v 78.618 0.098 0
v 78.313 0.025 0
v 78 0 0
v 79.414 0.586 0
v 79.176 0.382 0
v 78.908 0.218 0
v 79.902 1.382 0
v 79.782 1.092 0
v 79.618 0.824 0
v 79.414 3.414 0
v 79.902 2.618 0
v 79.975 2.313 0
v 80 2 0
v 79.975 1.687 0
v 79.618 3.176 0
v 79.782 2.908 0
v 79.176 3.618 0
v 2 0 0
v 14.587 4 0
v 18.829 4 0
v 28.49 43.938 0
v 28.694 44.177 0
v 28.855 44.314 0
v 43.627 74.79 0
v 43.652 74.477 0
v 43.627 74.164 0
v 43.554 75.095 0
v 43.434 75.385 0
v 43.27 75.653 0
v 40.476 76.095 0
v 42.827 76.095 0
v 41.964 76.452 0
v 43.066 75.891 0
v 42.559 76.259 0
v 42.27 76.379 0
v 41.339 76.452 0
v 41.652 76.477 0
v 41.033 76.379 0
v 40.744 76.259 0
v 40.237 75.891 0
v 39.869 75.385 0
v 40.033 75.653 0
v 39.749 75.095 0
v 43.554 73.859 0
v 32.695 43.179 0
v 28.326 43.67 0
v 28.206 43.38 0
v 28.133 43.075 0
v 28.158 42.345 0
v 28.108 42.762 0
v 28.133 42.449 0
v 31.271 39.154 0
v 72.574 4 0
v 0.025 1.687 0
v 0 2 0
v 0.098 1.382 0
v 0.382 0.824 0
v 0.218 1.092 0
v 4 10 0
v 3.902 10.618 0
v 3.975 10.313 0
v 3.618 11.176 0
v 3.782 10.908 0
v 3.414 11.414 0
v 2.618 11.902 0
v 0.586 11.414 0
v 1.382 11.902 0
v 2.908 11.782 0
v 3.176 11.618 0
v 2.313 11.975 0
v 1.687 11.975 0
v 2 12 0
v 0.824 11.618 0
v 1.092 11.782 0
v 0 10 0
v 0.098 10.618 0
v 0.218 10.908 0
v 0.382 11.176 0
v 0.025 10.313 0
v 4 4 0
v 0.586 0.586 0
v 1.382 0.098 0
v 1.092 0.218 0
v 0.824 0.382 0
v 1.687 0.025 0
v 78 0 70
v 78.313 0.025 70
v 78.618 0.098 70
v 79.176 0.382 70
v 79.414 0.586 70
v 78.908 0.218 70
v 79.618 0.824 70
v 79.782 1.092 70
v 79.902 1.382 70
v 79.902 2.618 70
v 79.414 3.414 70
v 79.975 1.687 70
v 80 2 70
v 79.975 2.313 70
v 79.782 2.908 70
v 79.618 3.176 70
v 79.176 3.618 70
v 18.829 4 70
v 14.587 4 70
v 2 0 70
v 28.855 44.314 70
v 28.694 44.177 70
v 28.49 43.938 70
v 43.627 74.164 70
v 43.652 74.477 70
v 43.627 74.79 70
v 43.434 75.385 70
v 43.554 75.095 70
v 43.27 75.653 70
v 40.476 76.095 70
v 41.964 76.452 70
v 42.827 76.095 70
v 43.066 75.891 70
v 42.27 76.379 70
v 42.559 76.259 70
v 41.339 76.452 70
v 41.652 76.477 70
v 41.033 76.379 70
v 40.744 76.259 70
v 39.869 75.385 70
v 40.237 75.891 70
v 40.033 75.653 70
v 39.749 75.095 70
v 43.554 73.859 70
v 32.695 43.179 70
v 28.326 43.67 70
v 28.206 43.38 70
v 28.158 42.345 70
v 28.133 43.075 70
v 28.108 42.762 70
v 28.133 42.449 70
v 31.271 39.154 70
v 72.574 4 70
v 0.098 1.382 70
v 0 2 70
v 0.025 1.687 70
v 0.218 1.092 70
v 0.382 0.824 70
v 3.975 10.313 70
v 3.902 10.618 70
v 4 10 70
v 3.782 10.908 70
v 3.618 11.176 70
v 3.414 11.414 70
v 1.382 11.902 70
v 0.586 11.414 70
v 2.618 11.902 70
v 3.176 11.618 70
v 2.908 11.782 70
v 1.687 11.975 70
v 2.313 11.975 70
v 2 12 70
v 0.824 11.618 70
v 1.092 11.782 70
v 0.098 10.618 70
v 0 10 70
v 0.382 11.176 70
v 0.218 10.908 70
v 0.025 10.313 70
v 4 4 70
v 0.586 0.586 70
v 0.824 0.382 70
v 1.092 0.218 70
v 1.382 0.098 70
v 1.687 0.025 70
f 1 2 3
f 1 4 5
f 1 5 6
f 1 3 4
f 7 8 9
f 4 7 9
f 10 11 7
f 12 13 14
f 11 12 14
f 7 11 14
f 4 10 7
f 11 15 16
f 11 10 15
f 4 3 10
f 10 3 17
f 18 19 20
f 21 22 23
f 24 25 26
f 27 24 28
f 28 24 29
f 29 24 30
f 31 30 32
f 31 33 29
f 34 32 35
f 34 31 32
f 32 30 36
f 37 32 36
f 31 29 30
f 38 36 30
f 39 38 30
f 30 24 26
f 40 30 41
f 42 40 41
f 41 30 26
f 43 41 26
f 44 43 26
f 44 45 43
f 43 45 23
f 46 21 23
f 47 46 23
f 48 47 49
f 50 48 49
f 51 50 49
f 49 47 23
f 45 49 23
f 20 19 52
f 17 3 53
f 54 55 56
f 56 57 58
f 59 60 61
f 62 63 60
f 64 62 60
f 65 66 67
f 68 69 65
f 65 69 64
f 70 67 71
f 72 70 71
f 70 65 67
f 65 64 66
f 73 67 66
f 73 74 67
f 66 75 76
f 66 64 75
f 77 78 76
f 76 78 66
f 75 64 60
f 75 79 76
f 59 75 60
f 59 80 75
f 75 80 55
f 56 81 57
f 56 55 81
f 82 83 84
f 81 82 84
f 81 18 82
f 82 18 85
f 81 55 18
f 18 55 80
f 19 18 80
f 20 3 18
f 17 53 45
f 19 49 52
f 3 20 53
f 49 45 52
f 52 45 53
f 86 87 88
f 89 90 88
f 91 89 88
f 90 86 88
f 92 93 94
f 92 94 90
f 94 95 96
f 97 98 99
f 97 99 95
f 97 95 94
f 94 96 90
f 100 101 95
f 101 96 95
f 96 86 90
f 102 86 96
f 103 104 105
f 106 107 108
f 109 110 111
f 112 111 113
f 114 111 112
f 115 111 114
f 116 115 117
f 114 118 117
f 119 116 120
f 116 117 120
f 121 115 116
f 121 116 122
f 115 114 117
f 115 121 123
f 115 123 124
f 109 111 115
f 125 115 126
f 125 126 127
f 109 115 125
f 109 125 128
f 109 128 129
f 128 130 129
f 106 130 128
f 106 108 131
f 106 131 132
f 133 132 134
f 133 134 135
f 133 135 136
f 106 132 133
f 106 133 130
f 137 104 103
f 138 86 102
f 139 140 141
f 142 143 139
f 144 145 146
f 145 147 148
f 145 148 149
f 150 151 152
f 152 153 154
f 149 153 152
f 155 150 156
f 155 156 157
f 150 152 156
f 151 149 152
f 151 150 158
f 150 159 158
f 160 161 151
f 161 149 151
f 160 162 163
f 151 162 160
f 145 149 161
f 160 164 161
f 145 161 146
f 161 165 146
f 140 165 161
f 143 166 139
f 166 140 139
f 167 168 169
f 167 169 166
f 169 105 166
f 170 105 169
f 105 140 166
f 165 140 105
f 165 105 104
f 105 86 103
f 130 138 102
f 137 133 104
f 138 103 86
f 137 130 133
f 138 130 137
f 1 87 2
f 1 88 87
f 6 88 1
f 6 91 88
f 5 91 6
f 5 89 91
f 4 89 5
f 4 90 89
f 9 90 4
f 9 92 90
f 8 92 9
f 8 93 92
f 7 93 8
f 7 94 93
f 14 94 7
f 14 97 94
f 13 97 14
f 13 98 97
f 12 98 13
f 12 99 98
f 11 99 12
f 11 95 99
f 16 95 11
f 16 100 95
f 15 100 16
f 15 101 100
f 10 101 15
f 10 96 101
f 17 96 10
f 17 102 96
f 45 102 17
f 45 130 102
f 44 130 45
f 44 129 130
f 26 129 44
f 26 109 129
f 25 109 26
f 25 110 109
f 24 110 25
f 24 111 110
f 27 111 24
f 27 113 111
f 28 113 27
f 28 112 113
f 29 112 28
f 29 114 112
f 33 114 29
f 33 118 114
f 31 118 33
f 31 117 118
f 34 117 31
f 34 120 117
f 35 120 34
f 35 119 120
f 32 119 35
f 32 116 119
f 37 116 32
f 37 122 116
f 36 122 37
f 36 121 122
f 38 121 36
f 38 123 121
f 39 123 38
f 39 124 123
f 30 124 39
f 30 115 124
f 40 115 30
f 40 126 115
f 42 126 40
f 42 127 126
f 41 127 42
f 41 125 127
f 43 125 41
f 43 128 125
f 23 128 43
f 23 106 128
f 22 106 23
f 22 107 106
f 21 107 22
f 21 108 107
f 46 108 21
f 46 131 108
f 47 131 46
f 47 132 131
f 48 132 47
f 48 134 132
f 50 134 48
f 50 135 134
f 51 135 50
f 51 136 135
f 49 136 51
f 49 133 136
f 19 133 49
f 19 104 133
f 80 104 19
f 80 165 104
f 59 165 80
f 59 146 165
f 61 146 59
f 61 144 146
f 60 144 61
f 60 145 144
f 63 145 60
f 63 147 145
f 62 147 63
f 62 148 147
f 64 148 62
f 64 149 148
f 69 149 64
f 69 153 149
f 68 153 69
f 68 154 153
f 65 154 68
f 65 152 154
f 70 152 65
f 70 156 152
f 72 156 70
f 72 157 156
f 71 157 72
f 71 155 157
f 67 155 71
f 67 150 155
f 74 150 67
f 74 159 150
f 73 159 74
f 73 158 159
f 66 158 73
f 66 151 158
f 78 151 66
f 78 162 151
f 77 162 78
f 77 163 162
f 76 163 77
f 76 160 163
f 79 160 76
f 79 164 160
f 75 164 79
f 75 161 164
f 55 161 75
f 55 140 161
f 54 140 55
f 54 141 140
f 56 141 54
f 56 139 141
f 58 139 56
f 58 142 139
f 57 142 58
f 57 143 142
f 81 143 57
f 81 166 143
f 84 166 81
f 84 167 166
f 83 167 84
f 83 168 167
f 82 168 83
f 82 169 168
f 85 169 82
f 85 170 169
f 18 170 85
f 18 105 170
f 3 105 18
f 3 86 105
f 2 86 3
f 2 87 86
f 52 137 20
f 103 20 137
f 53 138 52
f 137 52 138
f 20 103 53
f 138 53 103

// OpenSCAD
// Telefoonhouder / tabletstandaard
// Geschreven voor Tech demo 14 (OpenSCAD customizer). Licentie: CC0 1.0 / MIT.
// Ligt op zijn zijkant op het bed: geen support nodig en sterk in de lagen.

/* [Houder] */
// Breedte van de houder (mm)
breedte = 70; // [30:1:160]
// Kijkhoek ten opzichte van verticaal (graden)
hoek = 20; // [5:1:40]
// Dikte van je telefoon met hoesje (mm)
telefoon_dikte = 12; // [6:0.5:25]
// Lengte van de rugsteun (mm)
rug_lengte = 75; // [40:1:140]
// Lengte van de voet (mm)
voet_lengte = 80; // [50:1:150]
// Hoogte van de voorrand (mm)
voorrand = 10; // [5:0.5:25]
// Dikte van de delen (mm)
dikte = 4; // [3:0.5:8]

/* [Hidden] */
$fn = 40;

module staaf(a, b, d) { hull() { translate(a) circle(d = d); translate(b) circle(d = d); } }

module profiel() {
  r = dikte / 2;
  // goot: voorrand bij x=0, achterkant goot bij x = telefoon_dikte + dikte
  bak = telefoon_dikte + dikte;
  top = [bak + sin(hoek) * rug_lengte, dikte + cos(hoek) * rug_lengte];
  union() {
    staaf([r, r], [voet_lengte - r, r], dikte);                  // voet
    staaf([r, r], [r, voorrand], dikte);                          // voorrand
    staaf([bak, r], [top[0], top[1]], dikte);                     // rugsteun
    staaf([voet_lengte - r, r], [bak + sin(hoek) * rug_lengte * 0.55, dikte + cos(hoek) * rug_lengte * 0.55], dikte); // schoor
  }
}

linear_extrude(breedte) profiel();
